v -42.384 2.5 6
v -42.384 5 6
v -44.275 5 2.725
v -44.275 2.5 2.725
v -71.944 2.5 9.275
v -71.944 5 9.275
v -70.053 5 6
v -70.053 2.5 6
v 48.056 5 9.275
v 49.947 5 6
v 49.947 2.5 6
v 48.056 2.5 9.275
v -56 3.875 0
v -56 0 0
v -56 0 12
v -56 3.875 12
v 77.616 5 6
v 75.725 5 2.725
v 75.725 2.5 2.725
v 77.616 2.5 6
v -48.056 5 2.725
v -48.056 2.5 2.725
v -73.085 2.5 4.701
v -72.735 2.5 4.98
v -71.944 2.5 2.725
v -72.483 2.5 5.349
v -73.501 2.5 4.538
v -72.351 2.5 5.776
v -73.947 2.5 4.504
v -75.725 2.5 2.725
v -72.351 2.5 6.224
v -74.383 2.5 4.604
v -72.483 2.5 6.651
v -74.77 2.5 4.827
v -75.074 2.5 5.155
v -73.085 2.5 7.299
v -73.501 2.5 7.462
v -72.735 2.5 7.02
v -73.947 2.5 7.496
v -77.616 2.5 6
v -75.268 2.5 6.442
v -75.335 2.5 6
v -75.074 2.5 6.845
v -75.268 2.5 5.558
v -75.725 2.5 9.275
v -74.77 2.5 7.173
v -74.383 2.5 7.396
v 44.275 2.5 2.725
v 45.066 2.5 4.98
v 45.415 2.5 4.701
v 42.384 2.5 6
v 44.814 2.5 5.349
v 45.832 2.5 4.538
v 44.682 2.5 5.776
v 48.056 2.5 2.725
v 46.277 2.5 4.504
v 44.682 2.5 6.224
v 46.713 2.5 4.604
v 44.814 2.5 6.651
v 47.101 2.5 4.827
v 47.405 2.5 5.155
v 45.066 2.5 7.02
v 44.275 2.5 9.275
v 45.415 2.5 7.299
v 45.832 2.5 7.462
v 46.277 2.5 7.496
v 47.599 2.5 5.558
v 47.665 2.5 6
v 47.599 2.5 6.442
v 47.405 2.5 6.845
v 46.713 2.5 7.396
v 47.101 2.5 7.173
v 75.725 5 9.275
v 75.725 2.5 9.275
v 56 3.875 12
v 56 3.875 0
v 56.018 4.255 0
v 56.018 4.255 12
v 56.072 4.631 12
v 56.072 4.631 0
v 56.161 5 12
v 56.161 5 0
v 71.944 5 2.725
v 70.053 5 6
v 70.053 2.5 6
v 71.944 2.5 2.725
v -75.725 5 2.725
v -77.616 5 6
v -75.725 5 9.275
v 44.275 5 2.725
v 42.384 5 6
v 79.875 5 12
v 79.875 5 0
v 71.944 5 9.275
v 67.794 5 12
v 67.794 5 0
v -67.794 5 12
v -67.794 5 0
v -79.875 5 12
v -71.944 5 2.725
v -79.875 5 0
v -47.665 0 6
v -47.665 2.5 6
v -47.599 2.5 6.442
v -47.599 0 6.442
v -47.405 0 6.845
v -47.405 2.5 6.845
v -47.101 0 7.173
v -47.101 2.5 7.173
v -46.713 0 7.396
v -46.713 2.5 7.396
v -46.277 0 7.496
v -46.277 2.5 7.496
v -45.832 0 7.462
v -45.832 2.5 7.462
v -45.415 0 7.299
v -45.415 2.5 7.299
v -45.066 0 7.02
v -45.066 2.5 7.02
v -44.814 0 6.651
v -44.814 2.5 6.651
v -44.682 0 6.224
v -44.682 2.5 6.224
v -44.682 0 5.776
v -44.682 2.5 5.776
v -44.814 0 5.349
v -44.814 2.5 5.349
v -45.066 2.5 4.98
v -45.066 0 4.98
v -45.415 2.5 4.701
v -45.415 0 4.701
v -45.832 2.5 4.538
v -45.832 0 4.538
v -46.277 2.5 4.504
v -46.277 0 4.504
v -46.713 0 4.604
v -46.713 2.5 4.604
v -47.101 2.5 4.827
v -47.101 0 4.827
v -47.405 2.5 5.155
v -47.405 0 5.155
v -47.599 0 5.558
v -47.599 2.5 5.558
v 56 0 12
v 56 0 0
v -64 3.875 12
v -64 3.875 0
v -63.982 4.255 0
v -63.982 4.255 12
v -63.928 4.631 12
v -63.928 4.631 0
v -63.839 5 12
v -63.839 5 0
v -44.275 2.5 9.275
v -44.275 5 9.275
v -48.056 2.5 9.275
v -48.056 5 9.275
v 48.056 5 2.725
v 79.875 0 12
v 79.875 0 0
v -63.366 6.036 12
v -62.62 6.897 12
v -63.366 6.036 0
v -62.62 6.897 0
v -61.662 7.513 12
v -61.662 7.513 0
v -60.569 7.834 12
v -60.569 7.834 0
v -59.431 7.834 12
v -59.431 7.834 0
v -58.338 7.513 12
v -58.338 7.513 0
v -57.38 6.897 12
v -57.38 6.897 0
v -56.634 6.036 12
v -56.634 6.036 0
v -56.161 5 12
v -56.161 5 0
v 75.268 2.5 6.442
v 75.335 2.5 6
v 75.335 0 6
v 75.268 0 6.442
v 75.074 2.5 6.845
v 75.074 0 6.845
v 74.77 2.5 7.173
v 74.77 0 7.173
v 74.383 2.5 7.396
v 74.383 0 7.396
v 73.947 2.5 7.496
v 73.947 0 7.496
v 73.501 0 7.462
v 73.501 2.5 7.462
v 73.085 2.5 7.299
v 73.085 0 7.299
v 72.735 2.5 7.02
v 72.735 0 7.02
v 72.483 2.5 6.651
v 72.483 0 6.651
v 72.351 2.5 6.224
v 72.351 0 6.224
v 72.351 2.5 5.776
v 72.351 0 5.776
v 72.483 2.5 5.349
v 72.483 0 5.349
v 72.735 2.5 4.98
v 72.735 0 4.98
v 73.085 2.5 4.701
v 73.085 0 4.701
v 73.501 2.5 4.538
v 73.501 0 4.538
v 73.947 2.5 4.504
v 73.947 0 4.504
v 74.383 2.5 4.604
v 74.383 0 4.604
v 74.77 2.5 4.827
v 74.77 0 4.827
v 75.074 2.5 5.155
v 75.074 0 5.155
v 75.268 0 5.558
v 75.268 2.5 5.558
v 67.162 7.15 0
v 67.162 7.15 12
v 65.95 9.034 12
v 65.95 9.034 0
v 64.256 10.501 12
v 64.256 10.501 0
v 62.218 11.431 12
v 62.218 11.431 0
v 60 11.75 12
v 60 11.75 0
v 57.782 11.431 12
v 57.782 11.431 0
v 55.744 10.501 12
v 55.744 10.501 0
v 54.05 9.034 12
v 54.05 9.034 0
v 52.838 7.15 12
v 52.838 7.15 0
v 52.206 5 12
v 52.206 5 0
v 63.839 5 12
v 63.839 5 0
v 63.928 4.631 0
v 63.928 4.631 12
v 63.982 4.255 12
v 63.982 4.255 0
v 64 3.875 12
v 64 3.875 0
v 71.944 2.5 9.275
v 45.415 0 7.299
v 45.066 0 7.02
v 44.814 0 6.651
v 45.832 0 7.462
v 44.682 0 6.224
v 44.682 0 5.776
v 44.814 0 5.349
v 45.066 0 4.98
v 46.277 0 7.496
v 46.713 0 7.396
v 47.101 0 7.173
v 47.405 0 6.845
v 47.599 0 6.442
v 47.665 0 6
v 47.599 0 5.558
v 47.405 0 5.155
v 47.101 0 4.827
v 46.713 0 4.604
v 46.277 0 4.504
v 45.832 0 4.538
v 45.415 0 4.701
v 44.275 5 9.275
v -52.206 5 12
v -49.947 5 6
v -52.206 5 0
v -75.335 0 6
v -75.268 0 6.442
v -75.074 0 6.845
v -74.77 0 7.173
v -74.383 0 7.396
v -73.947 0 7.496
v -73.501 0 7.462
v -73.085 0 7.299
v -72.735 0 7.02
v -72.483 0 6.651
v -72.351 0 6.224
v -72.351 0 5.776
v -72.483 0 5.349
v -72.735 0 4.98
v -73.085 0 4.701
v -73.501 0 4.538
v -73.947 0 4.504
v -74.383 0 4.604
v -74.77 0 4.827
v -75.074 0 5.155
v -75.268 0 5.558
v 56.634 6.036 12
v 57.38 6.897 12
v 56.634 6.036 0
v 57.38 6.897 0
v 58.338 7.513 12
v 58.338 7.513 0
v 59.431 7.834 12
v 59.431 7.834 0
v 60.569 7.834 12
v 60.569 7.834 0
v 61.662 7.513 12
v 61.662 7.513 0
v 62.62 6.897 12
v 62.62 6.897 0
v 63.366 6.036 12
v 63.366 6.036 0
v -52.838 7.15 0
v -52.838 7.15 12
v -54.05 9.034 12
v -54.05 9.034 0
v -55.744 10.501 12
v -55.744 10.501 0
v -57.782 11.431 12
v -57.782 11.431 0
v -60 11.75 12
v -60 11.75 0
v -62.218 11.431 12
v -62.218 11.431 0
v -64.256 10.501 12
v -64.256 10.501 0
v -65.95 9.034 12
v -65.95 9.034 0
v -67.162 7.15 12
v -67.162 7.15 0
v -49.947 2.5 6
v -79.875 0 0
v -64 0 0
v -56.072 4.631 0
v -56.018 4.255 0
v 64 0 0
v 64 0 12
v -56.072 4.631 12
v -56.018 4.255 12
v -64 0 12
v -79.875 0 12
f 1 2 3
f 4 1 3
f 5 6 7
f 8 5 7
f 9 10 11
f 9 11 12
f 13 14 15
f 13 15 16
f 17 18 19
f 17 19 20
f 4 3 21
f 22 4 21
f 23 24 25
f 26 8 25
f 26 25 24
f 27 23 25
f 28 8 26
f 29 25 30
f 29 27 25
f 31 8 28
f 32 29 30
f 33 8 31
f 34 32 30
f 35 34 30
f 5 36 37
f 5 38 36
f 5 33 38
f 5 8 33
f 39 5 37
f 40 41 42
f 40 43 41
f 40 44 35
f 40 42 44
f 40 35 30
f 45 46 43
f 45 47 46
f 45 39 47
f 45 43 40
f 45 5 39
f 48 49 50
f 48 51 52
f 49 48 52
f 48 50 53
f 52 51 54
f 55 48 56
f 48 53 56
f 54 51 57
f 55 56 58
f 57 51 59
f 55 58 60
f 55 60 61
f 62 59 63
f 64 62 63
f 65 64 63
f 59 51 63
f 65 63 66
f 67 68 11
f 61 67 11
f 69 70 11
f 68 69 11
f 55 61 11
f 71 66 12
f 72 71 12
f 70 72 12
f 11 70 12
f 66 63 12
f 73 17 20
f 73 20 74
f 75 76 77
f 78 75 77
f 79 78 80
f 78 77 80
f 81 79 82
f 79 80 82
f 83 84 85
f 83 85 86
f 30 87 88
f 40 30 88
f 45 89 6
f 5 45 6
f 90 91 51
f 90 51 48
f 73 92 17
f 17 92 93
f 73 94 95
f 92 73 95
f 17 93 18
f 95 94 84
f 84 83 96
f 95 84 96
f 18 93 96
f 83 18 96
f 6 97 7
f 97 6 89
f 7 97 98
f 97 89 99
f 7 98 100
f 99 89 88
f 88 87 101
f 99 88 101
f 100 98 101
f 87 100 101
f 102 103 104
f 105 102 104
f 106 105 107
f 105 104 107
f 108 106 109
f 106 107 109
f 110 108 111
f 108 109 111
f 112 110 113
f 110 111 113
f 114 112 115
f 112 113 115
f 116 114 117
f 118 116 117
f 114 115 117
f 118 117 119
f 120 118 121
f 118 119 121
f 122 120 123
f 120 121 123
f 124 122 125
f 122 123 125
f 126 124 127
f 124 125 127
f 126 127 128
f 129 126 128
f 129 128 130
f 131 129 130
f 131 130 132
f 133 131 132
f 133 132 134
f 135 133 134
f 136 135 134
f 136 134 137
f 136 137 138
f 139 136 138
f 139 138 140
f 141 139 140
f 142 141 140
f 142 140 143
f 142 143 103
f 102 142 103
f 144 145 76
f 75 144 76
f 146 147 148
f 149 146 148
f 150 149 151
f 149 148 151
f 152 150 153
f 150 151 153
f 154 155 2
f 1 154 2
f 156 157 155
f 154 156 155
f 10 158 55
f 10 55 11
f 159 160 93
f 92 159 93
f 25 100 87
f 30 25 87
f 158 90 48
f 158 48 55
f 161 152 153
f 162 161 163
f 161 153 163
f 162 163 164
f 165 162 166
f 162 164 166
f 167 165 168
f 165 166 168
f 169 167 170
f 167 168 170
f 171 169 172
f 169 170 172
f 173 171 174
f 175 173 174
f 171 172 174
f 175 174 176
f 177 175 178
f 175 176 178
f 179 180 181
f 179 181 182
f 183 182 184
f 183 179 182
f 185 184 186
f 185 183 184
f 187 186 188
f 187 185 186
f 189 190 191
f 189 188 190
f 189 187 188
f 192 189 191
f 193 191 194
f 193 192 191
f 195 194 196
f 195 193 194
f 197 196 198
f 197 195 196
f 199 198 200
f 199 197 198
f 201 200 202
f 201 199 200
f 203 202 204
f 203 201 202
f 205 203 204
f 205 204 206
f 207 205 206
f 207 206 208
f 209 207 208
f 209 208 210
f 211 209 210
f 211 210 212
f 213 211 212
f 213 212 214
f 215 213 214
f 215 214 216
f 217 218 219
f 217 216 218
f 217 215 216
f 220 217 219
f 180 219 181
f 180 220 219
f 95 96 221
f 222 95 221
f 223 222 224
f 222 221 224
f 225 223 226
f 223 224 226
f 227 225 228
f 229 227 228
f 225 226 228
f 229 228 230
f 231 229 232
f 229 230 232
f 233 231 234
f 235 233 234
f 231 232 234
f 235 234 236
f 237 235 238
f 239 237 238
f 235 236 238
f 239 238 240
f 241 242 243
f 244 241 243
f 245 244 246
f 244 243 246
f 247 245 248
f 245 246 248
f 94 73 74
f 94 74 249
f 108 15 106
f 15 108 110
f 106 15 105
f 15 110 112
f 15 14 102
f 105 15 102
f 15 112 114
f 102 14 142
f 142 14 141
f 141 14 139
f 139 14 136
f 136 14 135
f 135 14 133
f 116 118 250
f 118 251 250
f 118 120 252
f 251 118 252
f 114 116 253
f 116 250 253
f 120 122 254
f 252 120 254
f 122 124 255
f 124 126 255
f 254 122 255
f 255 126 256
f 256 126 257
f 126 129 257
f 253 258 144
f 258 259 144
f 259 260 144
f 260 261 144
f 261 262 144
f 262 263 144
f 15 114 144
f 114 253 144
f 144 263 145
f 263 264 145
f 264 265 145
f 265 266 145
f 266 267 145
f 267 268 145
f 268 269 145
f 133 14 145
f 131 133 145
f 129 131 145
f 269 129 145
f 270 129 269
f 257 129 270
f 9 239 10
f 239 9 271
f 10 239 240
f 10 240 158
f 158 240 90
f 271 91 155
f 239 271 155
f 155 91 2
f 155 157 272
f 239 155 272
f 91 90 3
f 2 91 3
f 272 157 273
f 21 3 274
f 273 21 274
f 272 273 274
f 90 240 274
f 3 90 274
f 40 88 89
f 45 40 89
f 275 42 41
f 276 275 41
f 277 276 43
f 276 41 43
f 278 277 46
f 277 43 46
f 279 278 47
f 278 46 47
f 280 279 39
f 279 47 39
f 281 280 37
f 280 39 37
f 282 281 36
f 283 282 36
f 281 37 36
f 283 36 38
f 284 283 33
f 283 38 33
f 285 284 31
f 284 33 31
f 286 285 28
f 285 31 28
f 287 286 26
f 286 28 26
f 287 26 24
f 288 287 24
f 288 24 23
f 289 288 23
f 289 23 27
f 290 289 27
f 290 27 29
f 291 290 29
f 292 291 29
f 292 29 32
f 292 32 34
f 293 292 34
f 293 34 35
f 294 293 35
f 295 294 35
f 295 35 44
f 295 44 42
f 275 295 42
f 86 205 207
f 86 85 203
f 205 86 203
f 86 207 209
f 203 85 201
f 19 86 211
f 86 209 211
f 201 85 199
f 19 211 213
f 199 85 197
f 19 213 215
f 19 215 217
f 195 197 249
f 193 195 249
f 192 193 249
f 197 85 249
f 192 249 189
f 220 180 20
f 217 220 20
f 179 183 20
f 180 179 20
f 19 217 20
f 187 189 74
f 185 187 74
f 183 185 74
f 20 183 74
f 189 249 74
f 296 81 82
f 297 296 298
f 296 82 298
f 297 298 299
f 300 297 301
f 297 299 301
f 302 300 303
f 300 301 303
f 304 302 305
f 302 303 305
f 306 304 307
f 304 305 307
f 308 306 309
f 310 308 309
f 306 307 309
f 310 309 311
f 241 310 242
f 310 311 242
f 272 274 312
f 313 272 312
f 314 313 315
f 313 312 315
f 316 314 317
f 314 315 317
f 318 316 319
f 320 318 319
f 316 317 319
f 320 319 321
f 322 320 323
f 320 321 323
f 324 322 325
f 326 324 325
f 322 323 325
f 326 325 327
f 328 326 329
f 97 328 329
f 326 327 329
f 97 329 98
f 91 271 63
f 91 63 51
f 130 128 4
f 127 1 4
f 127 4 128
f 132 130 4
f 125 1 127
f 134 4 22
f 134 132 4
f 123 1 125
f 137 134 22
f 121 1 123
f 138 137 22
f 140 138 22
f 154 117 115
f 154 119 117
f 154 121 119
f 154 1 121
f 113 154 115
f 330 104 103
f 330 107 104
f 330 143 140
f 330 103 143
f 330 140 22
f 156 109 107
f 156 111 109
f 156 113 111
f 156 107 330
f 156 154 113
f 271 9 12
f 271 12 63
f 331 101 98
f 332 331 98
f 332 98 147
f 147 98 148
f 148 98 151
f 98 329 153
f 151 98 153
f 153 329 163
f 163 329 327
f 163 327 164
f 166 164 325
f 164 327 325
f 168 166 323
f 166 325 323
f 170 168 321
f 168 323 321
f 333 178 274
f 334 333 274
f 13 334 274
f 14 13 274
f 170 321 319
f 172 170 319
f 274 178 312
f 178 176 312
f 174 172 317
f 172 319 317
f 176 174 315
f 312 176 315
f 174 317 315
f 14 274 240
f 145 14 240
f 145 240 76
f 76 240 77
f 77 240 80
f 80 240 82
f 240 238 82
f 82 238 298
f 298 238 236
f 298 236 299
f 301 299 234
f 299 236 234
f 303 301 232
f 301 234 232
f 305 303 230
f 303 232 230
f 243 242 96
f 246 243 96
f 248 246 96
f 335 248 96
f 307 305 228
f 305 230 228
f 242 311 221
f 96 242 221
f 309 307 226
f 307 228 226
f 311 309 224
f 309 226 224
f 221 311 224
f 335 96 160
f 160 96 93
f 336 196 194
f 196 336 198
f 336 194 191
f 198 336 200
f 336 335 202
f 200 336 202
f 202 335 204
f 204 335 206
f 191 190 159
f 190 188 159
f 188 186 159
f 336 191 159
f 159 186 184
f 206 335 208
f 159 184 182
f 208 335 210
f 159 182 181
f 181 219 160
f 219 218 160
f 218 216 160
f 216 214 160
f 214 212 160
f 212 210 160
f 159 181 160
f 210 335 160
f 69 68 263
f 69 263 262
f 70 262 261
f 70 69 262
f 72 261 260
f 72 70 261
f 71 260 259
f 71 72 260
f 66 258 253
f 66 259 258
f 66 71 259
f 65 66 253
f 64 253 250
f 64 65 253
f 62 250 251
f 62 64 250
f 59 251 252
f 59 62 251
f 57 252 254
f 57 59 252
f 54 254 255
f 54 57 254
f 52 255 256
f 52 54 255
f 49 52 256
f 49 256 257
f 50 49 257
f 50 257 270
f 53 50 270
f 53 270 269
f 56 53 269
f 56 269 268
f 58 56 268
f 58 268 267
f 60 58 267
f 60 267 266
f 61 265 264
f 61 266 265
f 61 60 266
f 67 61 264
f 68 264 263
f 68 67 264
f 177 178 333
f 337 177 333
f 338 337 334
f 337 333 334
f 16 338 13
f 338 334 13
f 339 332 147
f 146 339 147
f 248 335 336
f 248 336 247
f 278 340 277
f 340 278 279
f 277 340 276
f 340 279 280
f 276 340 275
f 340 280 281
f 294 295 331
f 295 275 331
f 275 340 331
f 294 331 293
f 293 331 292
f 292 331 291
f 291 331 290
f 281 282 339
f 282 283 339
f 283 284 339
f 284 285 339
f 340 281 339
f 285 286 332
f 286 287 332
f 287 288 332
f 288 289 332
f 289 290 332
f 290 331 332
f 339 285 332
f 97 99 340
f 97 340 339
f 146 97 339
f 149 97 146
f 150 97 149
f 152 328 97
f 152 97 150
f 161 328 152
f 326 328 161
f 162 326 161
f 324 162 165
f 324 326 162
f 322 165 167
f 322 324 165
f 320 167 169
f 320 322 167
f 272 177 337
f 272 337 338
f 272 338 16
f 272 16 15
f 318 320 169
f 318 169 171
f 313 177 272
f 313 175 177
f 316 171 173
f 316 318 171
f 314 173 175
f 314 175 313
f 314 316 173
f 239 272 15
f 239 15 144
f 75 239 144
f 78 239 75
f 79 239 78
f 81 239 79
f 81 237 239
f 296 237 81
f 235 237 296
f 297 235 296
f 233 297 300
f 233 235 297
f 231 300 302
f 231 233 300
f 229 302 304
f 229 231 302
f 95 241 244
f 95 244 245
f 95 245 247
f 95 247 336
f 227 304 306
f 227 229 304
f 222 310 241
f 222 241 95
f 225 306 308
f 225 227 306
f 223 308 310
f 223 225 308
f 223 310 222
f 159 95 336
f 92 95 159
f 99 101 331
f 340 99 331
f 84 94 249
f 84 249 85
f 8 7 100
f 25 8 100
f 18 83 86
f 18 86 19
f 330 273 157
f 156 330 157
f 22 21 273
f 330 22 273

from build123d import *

# Parameters (mm, degrees)
F0_W     = 3.875
F0_H     = 3.875
F1_DEPTH = 12
F3_DEPTH = 2.5
F4_R     = 1.5
F5_DEPTH = 5.001


# Not quite as in the source:
# - a pattern or mirror of a feature is missing from the dataset's text; its kind, count and spacing are read off the source's solid
# - a feature names something its author has since deleted; it is built from what else it names


with BuildPart() as f1:
    # F0 (on Top) → F1 (new body)
    with BuildSketch(Plane.XY):
        with BuildLine():
            Line((-67.7942286341, 5), (-79.875, 5))
            Line((-79.875, 5), (-79.875, 0))
            Line((-79.875, 0), (-67.875, 0))
            Line((-67.875, 0), (-67.875, 3.875))
            ThreePointArc((-67.875, 3.875), (-67.854781203, 4.4389479173), (-67.7942286341, 5))
        make_face()
        with BuildLine():
            ThreePointArc((-52.2057713659, 5), (-60, 11.75), (-67.7942286341, 5))
            Line((-67.7942286341, 5), (-63.8385381332, 5))
            ThreePointArc((-63.8385381332, 5), (-60, 7.875), (-56.1614618668, 5))
            Line((-56.1614618668, 5), (-52.2057713659, 5))
        make_face()
        with BuildLine():
            Line((-63.8385381332, 5), (-67.7942286341, 5))
            ThreePointArc((-67.7942286341, 5), (-67.854781203, 4.4389479173), (-67.875, 3.875))
            Line((-67.875, 3.875), (-64, 3.875))
            ThreePointArc((-64, 3.875), (-63.9594287803, 4.4432637888), (-63.8385381332, 5))
        make_face()
        with BuildLine():
            ThreePointArc((-52.125, 3.875), (-52.145218797, 4.4389479173), (-52.2057713659, 5))
            Line((-52.2057713659, 5), (-56.1614618668, 5))
            ThreePointArc((-56.1614618668, 5), (-56.0405712197, 4.4432637888), (-56, 3.875))
            Line((-56, 3.875), (-52.125, 3.875))
        make_face()
        with BuildLine():
            Line((52.2057713659, 5), (-52.2057713659, 5))
            ThreePointArc((-52.2057713659, 5), (-52.145218797, 4.4389479173), (-52.125, 3.875))
            Line((-52.125, 3.875), (-52.125, 0))
            Line((-52.125, 0), (52.125, 0))
            Line((52.125, 0), (52.125, 3.875))
            ThreePointArc((52.125, 3.875), (52.145218797, 4.4389479173), (52.2057713659, 5))
        make_face()
        with Locations((-65.9375, 1.9375)):
            Rectangle(F0_W, F0_H)
        with BuildLine():
            ThreePointArc((67.7942286341, 5), (60, 11.75), (52.2057713659, 5))
            Line((52.2057713659, 5), (56.1614618668, 5))
            ThreePointArc((56.1614618668, 5), (60, 7.875), (63.8385381332, 5))
            Line((63.8385381332, 5), (67.7942286341, 5))
        make_face()
        with BuildLine():
            Line((56.1614618668, 5), (52.2057713659, 5))
            ThreePointArc((52.2057713659, 5), (52.145218797, 4.4389479173), (52.125, 3.875))
            Line((52.125, 3.875), (56, 3.875))
            ThreePointArc((56, 3.875), (56.0405712197, 4.4432637888), (56.1614618668, 5))
        make_face()
        with Locations((-54.0625, 1.9375)):
            Rectangle(F0_W, F0_H)
        with BuildLine():
            ThreePointArc((67.875, 3.875), (67.854781203, 4.4389479173), (67.7942286341, 5))
            Line((67.7942286341, 5), (63.8385381332, 5))
            ThreePointArc((63.8385381332, 5), (63.9594287803, 4.4432637888), (64, 3.875))
            Line((64, 3.875), (67.875, 3.875))
        make_face()
        with BuildLine():
            Line((79.875, 5), (67.7942286341, 5))
            ThreePointArc((67.7942286341, 5), (67.854781203, 4.4389479173), (67.875, 3.875))
            Line((67.875, 3.875), (67.875, 0))
            Line((67.875, 0), (79.875, 0))
            Line((79.875, 0), (79.875, 5))
        make_face()
        with Locations((54.0625, 1.9375)):
            Rectangle(F0_W, F0_H)
        with Locations((65.9375, 1.9375)):
            Rectangle(F0_W, F0_H)
    extrude(amount=F1_DEPTH)

    # F2 (on face) → F3 (cut)
    with BuildSketch(Plane(origin=(0, 5, 0), x_dir=(-1, 0, 0), z_dir=(0, 1, 0))):
        Polygon((44.2745635514, 2.725), (48.0562078146, 2.725), (49.9470299462, 6), (48.0562078146, 9.275), (44.2745635514, 9.275), (42.3837414198, 6), align=None)
        Polygon((71.9437921854, 2.725), (75.7254364486, 2.725), (77.6162585802, 6), (75.7254364486, 9.275), (71.9437921854, 9.275), (70.0529700538, 6), align=None)
    f3 = extrude(amount=-F3_DEPTH, mode=Mode.SUBTRACT)

    # F3_copies: F3 across plane
    add(f3.mirror(Plane(origin=(0, 0, 0), x_dir=(0, 0, 1), z_dir=(1, 0, 0))), mode=Mode.SUBTRACT)

    # F4 (on face) → F5 (cut, through all)
    with BuildSketch(Plane(origin=(0, 5, 0), x_dir=(-1, 0, 0), z_dir=(0, 1, 0))):
        with Locations((46.165385683, 6)):
            Circle(F4_R)
        with Locations((73.834614317, 6)):
            Circle(F4_R)
    f5 = extrude(amount=-F5_DEPTH, mode=Mode.SUBTRACT)

    # F5_copies: F5 across plane
    add(f5.mirror(Plane(origin=(0, 0, 0), x_dir=(0, 0, 1), z_dir=(1, 0, 0))), mode=Mode.SUBTRACT)


solid = f1.part
